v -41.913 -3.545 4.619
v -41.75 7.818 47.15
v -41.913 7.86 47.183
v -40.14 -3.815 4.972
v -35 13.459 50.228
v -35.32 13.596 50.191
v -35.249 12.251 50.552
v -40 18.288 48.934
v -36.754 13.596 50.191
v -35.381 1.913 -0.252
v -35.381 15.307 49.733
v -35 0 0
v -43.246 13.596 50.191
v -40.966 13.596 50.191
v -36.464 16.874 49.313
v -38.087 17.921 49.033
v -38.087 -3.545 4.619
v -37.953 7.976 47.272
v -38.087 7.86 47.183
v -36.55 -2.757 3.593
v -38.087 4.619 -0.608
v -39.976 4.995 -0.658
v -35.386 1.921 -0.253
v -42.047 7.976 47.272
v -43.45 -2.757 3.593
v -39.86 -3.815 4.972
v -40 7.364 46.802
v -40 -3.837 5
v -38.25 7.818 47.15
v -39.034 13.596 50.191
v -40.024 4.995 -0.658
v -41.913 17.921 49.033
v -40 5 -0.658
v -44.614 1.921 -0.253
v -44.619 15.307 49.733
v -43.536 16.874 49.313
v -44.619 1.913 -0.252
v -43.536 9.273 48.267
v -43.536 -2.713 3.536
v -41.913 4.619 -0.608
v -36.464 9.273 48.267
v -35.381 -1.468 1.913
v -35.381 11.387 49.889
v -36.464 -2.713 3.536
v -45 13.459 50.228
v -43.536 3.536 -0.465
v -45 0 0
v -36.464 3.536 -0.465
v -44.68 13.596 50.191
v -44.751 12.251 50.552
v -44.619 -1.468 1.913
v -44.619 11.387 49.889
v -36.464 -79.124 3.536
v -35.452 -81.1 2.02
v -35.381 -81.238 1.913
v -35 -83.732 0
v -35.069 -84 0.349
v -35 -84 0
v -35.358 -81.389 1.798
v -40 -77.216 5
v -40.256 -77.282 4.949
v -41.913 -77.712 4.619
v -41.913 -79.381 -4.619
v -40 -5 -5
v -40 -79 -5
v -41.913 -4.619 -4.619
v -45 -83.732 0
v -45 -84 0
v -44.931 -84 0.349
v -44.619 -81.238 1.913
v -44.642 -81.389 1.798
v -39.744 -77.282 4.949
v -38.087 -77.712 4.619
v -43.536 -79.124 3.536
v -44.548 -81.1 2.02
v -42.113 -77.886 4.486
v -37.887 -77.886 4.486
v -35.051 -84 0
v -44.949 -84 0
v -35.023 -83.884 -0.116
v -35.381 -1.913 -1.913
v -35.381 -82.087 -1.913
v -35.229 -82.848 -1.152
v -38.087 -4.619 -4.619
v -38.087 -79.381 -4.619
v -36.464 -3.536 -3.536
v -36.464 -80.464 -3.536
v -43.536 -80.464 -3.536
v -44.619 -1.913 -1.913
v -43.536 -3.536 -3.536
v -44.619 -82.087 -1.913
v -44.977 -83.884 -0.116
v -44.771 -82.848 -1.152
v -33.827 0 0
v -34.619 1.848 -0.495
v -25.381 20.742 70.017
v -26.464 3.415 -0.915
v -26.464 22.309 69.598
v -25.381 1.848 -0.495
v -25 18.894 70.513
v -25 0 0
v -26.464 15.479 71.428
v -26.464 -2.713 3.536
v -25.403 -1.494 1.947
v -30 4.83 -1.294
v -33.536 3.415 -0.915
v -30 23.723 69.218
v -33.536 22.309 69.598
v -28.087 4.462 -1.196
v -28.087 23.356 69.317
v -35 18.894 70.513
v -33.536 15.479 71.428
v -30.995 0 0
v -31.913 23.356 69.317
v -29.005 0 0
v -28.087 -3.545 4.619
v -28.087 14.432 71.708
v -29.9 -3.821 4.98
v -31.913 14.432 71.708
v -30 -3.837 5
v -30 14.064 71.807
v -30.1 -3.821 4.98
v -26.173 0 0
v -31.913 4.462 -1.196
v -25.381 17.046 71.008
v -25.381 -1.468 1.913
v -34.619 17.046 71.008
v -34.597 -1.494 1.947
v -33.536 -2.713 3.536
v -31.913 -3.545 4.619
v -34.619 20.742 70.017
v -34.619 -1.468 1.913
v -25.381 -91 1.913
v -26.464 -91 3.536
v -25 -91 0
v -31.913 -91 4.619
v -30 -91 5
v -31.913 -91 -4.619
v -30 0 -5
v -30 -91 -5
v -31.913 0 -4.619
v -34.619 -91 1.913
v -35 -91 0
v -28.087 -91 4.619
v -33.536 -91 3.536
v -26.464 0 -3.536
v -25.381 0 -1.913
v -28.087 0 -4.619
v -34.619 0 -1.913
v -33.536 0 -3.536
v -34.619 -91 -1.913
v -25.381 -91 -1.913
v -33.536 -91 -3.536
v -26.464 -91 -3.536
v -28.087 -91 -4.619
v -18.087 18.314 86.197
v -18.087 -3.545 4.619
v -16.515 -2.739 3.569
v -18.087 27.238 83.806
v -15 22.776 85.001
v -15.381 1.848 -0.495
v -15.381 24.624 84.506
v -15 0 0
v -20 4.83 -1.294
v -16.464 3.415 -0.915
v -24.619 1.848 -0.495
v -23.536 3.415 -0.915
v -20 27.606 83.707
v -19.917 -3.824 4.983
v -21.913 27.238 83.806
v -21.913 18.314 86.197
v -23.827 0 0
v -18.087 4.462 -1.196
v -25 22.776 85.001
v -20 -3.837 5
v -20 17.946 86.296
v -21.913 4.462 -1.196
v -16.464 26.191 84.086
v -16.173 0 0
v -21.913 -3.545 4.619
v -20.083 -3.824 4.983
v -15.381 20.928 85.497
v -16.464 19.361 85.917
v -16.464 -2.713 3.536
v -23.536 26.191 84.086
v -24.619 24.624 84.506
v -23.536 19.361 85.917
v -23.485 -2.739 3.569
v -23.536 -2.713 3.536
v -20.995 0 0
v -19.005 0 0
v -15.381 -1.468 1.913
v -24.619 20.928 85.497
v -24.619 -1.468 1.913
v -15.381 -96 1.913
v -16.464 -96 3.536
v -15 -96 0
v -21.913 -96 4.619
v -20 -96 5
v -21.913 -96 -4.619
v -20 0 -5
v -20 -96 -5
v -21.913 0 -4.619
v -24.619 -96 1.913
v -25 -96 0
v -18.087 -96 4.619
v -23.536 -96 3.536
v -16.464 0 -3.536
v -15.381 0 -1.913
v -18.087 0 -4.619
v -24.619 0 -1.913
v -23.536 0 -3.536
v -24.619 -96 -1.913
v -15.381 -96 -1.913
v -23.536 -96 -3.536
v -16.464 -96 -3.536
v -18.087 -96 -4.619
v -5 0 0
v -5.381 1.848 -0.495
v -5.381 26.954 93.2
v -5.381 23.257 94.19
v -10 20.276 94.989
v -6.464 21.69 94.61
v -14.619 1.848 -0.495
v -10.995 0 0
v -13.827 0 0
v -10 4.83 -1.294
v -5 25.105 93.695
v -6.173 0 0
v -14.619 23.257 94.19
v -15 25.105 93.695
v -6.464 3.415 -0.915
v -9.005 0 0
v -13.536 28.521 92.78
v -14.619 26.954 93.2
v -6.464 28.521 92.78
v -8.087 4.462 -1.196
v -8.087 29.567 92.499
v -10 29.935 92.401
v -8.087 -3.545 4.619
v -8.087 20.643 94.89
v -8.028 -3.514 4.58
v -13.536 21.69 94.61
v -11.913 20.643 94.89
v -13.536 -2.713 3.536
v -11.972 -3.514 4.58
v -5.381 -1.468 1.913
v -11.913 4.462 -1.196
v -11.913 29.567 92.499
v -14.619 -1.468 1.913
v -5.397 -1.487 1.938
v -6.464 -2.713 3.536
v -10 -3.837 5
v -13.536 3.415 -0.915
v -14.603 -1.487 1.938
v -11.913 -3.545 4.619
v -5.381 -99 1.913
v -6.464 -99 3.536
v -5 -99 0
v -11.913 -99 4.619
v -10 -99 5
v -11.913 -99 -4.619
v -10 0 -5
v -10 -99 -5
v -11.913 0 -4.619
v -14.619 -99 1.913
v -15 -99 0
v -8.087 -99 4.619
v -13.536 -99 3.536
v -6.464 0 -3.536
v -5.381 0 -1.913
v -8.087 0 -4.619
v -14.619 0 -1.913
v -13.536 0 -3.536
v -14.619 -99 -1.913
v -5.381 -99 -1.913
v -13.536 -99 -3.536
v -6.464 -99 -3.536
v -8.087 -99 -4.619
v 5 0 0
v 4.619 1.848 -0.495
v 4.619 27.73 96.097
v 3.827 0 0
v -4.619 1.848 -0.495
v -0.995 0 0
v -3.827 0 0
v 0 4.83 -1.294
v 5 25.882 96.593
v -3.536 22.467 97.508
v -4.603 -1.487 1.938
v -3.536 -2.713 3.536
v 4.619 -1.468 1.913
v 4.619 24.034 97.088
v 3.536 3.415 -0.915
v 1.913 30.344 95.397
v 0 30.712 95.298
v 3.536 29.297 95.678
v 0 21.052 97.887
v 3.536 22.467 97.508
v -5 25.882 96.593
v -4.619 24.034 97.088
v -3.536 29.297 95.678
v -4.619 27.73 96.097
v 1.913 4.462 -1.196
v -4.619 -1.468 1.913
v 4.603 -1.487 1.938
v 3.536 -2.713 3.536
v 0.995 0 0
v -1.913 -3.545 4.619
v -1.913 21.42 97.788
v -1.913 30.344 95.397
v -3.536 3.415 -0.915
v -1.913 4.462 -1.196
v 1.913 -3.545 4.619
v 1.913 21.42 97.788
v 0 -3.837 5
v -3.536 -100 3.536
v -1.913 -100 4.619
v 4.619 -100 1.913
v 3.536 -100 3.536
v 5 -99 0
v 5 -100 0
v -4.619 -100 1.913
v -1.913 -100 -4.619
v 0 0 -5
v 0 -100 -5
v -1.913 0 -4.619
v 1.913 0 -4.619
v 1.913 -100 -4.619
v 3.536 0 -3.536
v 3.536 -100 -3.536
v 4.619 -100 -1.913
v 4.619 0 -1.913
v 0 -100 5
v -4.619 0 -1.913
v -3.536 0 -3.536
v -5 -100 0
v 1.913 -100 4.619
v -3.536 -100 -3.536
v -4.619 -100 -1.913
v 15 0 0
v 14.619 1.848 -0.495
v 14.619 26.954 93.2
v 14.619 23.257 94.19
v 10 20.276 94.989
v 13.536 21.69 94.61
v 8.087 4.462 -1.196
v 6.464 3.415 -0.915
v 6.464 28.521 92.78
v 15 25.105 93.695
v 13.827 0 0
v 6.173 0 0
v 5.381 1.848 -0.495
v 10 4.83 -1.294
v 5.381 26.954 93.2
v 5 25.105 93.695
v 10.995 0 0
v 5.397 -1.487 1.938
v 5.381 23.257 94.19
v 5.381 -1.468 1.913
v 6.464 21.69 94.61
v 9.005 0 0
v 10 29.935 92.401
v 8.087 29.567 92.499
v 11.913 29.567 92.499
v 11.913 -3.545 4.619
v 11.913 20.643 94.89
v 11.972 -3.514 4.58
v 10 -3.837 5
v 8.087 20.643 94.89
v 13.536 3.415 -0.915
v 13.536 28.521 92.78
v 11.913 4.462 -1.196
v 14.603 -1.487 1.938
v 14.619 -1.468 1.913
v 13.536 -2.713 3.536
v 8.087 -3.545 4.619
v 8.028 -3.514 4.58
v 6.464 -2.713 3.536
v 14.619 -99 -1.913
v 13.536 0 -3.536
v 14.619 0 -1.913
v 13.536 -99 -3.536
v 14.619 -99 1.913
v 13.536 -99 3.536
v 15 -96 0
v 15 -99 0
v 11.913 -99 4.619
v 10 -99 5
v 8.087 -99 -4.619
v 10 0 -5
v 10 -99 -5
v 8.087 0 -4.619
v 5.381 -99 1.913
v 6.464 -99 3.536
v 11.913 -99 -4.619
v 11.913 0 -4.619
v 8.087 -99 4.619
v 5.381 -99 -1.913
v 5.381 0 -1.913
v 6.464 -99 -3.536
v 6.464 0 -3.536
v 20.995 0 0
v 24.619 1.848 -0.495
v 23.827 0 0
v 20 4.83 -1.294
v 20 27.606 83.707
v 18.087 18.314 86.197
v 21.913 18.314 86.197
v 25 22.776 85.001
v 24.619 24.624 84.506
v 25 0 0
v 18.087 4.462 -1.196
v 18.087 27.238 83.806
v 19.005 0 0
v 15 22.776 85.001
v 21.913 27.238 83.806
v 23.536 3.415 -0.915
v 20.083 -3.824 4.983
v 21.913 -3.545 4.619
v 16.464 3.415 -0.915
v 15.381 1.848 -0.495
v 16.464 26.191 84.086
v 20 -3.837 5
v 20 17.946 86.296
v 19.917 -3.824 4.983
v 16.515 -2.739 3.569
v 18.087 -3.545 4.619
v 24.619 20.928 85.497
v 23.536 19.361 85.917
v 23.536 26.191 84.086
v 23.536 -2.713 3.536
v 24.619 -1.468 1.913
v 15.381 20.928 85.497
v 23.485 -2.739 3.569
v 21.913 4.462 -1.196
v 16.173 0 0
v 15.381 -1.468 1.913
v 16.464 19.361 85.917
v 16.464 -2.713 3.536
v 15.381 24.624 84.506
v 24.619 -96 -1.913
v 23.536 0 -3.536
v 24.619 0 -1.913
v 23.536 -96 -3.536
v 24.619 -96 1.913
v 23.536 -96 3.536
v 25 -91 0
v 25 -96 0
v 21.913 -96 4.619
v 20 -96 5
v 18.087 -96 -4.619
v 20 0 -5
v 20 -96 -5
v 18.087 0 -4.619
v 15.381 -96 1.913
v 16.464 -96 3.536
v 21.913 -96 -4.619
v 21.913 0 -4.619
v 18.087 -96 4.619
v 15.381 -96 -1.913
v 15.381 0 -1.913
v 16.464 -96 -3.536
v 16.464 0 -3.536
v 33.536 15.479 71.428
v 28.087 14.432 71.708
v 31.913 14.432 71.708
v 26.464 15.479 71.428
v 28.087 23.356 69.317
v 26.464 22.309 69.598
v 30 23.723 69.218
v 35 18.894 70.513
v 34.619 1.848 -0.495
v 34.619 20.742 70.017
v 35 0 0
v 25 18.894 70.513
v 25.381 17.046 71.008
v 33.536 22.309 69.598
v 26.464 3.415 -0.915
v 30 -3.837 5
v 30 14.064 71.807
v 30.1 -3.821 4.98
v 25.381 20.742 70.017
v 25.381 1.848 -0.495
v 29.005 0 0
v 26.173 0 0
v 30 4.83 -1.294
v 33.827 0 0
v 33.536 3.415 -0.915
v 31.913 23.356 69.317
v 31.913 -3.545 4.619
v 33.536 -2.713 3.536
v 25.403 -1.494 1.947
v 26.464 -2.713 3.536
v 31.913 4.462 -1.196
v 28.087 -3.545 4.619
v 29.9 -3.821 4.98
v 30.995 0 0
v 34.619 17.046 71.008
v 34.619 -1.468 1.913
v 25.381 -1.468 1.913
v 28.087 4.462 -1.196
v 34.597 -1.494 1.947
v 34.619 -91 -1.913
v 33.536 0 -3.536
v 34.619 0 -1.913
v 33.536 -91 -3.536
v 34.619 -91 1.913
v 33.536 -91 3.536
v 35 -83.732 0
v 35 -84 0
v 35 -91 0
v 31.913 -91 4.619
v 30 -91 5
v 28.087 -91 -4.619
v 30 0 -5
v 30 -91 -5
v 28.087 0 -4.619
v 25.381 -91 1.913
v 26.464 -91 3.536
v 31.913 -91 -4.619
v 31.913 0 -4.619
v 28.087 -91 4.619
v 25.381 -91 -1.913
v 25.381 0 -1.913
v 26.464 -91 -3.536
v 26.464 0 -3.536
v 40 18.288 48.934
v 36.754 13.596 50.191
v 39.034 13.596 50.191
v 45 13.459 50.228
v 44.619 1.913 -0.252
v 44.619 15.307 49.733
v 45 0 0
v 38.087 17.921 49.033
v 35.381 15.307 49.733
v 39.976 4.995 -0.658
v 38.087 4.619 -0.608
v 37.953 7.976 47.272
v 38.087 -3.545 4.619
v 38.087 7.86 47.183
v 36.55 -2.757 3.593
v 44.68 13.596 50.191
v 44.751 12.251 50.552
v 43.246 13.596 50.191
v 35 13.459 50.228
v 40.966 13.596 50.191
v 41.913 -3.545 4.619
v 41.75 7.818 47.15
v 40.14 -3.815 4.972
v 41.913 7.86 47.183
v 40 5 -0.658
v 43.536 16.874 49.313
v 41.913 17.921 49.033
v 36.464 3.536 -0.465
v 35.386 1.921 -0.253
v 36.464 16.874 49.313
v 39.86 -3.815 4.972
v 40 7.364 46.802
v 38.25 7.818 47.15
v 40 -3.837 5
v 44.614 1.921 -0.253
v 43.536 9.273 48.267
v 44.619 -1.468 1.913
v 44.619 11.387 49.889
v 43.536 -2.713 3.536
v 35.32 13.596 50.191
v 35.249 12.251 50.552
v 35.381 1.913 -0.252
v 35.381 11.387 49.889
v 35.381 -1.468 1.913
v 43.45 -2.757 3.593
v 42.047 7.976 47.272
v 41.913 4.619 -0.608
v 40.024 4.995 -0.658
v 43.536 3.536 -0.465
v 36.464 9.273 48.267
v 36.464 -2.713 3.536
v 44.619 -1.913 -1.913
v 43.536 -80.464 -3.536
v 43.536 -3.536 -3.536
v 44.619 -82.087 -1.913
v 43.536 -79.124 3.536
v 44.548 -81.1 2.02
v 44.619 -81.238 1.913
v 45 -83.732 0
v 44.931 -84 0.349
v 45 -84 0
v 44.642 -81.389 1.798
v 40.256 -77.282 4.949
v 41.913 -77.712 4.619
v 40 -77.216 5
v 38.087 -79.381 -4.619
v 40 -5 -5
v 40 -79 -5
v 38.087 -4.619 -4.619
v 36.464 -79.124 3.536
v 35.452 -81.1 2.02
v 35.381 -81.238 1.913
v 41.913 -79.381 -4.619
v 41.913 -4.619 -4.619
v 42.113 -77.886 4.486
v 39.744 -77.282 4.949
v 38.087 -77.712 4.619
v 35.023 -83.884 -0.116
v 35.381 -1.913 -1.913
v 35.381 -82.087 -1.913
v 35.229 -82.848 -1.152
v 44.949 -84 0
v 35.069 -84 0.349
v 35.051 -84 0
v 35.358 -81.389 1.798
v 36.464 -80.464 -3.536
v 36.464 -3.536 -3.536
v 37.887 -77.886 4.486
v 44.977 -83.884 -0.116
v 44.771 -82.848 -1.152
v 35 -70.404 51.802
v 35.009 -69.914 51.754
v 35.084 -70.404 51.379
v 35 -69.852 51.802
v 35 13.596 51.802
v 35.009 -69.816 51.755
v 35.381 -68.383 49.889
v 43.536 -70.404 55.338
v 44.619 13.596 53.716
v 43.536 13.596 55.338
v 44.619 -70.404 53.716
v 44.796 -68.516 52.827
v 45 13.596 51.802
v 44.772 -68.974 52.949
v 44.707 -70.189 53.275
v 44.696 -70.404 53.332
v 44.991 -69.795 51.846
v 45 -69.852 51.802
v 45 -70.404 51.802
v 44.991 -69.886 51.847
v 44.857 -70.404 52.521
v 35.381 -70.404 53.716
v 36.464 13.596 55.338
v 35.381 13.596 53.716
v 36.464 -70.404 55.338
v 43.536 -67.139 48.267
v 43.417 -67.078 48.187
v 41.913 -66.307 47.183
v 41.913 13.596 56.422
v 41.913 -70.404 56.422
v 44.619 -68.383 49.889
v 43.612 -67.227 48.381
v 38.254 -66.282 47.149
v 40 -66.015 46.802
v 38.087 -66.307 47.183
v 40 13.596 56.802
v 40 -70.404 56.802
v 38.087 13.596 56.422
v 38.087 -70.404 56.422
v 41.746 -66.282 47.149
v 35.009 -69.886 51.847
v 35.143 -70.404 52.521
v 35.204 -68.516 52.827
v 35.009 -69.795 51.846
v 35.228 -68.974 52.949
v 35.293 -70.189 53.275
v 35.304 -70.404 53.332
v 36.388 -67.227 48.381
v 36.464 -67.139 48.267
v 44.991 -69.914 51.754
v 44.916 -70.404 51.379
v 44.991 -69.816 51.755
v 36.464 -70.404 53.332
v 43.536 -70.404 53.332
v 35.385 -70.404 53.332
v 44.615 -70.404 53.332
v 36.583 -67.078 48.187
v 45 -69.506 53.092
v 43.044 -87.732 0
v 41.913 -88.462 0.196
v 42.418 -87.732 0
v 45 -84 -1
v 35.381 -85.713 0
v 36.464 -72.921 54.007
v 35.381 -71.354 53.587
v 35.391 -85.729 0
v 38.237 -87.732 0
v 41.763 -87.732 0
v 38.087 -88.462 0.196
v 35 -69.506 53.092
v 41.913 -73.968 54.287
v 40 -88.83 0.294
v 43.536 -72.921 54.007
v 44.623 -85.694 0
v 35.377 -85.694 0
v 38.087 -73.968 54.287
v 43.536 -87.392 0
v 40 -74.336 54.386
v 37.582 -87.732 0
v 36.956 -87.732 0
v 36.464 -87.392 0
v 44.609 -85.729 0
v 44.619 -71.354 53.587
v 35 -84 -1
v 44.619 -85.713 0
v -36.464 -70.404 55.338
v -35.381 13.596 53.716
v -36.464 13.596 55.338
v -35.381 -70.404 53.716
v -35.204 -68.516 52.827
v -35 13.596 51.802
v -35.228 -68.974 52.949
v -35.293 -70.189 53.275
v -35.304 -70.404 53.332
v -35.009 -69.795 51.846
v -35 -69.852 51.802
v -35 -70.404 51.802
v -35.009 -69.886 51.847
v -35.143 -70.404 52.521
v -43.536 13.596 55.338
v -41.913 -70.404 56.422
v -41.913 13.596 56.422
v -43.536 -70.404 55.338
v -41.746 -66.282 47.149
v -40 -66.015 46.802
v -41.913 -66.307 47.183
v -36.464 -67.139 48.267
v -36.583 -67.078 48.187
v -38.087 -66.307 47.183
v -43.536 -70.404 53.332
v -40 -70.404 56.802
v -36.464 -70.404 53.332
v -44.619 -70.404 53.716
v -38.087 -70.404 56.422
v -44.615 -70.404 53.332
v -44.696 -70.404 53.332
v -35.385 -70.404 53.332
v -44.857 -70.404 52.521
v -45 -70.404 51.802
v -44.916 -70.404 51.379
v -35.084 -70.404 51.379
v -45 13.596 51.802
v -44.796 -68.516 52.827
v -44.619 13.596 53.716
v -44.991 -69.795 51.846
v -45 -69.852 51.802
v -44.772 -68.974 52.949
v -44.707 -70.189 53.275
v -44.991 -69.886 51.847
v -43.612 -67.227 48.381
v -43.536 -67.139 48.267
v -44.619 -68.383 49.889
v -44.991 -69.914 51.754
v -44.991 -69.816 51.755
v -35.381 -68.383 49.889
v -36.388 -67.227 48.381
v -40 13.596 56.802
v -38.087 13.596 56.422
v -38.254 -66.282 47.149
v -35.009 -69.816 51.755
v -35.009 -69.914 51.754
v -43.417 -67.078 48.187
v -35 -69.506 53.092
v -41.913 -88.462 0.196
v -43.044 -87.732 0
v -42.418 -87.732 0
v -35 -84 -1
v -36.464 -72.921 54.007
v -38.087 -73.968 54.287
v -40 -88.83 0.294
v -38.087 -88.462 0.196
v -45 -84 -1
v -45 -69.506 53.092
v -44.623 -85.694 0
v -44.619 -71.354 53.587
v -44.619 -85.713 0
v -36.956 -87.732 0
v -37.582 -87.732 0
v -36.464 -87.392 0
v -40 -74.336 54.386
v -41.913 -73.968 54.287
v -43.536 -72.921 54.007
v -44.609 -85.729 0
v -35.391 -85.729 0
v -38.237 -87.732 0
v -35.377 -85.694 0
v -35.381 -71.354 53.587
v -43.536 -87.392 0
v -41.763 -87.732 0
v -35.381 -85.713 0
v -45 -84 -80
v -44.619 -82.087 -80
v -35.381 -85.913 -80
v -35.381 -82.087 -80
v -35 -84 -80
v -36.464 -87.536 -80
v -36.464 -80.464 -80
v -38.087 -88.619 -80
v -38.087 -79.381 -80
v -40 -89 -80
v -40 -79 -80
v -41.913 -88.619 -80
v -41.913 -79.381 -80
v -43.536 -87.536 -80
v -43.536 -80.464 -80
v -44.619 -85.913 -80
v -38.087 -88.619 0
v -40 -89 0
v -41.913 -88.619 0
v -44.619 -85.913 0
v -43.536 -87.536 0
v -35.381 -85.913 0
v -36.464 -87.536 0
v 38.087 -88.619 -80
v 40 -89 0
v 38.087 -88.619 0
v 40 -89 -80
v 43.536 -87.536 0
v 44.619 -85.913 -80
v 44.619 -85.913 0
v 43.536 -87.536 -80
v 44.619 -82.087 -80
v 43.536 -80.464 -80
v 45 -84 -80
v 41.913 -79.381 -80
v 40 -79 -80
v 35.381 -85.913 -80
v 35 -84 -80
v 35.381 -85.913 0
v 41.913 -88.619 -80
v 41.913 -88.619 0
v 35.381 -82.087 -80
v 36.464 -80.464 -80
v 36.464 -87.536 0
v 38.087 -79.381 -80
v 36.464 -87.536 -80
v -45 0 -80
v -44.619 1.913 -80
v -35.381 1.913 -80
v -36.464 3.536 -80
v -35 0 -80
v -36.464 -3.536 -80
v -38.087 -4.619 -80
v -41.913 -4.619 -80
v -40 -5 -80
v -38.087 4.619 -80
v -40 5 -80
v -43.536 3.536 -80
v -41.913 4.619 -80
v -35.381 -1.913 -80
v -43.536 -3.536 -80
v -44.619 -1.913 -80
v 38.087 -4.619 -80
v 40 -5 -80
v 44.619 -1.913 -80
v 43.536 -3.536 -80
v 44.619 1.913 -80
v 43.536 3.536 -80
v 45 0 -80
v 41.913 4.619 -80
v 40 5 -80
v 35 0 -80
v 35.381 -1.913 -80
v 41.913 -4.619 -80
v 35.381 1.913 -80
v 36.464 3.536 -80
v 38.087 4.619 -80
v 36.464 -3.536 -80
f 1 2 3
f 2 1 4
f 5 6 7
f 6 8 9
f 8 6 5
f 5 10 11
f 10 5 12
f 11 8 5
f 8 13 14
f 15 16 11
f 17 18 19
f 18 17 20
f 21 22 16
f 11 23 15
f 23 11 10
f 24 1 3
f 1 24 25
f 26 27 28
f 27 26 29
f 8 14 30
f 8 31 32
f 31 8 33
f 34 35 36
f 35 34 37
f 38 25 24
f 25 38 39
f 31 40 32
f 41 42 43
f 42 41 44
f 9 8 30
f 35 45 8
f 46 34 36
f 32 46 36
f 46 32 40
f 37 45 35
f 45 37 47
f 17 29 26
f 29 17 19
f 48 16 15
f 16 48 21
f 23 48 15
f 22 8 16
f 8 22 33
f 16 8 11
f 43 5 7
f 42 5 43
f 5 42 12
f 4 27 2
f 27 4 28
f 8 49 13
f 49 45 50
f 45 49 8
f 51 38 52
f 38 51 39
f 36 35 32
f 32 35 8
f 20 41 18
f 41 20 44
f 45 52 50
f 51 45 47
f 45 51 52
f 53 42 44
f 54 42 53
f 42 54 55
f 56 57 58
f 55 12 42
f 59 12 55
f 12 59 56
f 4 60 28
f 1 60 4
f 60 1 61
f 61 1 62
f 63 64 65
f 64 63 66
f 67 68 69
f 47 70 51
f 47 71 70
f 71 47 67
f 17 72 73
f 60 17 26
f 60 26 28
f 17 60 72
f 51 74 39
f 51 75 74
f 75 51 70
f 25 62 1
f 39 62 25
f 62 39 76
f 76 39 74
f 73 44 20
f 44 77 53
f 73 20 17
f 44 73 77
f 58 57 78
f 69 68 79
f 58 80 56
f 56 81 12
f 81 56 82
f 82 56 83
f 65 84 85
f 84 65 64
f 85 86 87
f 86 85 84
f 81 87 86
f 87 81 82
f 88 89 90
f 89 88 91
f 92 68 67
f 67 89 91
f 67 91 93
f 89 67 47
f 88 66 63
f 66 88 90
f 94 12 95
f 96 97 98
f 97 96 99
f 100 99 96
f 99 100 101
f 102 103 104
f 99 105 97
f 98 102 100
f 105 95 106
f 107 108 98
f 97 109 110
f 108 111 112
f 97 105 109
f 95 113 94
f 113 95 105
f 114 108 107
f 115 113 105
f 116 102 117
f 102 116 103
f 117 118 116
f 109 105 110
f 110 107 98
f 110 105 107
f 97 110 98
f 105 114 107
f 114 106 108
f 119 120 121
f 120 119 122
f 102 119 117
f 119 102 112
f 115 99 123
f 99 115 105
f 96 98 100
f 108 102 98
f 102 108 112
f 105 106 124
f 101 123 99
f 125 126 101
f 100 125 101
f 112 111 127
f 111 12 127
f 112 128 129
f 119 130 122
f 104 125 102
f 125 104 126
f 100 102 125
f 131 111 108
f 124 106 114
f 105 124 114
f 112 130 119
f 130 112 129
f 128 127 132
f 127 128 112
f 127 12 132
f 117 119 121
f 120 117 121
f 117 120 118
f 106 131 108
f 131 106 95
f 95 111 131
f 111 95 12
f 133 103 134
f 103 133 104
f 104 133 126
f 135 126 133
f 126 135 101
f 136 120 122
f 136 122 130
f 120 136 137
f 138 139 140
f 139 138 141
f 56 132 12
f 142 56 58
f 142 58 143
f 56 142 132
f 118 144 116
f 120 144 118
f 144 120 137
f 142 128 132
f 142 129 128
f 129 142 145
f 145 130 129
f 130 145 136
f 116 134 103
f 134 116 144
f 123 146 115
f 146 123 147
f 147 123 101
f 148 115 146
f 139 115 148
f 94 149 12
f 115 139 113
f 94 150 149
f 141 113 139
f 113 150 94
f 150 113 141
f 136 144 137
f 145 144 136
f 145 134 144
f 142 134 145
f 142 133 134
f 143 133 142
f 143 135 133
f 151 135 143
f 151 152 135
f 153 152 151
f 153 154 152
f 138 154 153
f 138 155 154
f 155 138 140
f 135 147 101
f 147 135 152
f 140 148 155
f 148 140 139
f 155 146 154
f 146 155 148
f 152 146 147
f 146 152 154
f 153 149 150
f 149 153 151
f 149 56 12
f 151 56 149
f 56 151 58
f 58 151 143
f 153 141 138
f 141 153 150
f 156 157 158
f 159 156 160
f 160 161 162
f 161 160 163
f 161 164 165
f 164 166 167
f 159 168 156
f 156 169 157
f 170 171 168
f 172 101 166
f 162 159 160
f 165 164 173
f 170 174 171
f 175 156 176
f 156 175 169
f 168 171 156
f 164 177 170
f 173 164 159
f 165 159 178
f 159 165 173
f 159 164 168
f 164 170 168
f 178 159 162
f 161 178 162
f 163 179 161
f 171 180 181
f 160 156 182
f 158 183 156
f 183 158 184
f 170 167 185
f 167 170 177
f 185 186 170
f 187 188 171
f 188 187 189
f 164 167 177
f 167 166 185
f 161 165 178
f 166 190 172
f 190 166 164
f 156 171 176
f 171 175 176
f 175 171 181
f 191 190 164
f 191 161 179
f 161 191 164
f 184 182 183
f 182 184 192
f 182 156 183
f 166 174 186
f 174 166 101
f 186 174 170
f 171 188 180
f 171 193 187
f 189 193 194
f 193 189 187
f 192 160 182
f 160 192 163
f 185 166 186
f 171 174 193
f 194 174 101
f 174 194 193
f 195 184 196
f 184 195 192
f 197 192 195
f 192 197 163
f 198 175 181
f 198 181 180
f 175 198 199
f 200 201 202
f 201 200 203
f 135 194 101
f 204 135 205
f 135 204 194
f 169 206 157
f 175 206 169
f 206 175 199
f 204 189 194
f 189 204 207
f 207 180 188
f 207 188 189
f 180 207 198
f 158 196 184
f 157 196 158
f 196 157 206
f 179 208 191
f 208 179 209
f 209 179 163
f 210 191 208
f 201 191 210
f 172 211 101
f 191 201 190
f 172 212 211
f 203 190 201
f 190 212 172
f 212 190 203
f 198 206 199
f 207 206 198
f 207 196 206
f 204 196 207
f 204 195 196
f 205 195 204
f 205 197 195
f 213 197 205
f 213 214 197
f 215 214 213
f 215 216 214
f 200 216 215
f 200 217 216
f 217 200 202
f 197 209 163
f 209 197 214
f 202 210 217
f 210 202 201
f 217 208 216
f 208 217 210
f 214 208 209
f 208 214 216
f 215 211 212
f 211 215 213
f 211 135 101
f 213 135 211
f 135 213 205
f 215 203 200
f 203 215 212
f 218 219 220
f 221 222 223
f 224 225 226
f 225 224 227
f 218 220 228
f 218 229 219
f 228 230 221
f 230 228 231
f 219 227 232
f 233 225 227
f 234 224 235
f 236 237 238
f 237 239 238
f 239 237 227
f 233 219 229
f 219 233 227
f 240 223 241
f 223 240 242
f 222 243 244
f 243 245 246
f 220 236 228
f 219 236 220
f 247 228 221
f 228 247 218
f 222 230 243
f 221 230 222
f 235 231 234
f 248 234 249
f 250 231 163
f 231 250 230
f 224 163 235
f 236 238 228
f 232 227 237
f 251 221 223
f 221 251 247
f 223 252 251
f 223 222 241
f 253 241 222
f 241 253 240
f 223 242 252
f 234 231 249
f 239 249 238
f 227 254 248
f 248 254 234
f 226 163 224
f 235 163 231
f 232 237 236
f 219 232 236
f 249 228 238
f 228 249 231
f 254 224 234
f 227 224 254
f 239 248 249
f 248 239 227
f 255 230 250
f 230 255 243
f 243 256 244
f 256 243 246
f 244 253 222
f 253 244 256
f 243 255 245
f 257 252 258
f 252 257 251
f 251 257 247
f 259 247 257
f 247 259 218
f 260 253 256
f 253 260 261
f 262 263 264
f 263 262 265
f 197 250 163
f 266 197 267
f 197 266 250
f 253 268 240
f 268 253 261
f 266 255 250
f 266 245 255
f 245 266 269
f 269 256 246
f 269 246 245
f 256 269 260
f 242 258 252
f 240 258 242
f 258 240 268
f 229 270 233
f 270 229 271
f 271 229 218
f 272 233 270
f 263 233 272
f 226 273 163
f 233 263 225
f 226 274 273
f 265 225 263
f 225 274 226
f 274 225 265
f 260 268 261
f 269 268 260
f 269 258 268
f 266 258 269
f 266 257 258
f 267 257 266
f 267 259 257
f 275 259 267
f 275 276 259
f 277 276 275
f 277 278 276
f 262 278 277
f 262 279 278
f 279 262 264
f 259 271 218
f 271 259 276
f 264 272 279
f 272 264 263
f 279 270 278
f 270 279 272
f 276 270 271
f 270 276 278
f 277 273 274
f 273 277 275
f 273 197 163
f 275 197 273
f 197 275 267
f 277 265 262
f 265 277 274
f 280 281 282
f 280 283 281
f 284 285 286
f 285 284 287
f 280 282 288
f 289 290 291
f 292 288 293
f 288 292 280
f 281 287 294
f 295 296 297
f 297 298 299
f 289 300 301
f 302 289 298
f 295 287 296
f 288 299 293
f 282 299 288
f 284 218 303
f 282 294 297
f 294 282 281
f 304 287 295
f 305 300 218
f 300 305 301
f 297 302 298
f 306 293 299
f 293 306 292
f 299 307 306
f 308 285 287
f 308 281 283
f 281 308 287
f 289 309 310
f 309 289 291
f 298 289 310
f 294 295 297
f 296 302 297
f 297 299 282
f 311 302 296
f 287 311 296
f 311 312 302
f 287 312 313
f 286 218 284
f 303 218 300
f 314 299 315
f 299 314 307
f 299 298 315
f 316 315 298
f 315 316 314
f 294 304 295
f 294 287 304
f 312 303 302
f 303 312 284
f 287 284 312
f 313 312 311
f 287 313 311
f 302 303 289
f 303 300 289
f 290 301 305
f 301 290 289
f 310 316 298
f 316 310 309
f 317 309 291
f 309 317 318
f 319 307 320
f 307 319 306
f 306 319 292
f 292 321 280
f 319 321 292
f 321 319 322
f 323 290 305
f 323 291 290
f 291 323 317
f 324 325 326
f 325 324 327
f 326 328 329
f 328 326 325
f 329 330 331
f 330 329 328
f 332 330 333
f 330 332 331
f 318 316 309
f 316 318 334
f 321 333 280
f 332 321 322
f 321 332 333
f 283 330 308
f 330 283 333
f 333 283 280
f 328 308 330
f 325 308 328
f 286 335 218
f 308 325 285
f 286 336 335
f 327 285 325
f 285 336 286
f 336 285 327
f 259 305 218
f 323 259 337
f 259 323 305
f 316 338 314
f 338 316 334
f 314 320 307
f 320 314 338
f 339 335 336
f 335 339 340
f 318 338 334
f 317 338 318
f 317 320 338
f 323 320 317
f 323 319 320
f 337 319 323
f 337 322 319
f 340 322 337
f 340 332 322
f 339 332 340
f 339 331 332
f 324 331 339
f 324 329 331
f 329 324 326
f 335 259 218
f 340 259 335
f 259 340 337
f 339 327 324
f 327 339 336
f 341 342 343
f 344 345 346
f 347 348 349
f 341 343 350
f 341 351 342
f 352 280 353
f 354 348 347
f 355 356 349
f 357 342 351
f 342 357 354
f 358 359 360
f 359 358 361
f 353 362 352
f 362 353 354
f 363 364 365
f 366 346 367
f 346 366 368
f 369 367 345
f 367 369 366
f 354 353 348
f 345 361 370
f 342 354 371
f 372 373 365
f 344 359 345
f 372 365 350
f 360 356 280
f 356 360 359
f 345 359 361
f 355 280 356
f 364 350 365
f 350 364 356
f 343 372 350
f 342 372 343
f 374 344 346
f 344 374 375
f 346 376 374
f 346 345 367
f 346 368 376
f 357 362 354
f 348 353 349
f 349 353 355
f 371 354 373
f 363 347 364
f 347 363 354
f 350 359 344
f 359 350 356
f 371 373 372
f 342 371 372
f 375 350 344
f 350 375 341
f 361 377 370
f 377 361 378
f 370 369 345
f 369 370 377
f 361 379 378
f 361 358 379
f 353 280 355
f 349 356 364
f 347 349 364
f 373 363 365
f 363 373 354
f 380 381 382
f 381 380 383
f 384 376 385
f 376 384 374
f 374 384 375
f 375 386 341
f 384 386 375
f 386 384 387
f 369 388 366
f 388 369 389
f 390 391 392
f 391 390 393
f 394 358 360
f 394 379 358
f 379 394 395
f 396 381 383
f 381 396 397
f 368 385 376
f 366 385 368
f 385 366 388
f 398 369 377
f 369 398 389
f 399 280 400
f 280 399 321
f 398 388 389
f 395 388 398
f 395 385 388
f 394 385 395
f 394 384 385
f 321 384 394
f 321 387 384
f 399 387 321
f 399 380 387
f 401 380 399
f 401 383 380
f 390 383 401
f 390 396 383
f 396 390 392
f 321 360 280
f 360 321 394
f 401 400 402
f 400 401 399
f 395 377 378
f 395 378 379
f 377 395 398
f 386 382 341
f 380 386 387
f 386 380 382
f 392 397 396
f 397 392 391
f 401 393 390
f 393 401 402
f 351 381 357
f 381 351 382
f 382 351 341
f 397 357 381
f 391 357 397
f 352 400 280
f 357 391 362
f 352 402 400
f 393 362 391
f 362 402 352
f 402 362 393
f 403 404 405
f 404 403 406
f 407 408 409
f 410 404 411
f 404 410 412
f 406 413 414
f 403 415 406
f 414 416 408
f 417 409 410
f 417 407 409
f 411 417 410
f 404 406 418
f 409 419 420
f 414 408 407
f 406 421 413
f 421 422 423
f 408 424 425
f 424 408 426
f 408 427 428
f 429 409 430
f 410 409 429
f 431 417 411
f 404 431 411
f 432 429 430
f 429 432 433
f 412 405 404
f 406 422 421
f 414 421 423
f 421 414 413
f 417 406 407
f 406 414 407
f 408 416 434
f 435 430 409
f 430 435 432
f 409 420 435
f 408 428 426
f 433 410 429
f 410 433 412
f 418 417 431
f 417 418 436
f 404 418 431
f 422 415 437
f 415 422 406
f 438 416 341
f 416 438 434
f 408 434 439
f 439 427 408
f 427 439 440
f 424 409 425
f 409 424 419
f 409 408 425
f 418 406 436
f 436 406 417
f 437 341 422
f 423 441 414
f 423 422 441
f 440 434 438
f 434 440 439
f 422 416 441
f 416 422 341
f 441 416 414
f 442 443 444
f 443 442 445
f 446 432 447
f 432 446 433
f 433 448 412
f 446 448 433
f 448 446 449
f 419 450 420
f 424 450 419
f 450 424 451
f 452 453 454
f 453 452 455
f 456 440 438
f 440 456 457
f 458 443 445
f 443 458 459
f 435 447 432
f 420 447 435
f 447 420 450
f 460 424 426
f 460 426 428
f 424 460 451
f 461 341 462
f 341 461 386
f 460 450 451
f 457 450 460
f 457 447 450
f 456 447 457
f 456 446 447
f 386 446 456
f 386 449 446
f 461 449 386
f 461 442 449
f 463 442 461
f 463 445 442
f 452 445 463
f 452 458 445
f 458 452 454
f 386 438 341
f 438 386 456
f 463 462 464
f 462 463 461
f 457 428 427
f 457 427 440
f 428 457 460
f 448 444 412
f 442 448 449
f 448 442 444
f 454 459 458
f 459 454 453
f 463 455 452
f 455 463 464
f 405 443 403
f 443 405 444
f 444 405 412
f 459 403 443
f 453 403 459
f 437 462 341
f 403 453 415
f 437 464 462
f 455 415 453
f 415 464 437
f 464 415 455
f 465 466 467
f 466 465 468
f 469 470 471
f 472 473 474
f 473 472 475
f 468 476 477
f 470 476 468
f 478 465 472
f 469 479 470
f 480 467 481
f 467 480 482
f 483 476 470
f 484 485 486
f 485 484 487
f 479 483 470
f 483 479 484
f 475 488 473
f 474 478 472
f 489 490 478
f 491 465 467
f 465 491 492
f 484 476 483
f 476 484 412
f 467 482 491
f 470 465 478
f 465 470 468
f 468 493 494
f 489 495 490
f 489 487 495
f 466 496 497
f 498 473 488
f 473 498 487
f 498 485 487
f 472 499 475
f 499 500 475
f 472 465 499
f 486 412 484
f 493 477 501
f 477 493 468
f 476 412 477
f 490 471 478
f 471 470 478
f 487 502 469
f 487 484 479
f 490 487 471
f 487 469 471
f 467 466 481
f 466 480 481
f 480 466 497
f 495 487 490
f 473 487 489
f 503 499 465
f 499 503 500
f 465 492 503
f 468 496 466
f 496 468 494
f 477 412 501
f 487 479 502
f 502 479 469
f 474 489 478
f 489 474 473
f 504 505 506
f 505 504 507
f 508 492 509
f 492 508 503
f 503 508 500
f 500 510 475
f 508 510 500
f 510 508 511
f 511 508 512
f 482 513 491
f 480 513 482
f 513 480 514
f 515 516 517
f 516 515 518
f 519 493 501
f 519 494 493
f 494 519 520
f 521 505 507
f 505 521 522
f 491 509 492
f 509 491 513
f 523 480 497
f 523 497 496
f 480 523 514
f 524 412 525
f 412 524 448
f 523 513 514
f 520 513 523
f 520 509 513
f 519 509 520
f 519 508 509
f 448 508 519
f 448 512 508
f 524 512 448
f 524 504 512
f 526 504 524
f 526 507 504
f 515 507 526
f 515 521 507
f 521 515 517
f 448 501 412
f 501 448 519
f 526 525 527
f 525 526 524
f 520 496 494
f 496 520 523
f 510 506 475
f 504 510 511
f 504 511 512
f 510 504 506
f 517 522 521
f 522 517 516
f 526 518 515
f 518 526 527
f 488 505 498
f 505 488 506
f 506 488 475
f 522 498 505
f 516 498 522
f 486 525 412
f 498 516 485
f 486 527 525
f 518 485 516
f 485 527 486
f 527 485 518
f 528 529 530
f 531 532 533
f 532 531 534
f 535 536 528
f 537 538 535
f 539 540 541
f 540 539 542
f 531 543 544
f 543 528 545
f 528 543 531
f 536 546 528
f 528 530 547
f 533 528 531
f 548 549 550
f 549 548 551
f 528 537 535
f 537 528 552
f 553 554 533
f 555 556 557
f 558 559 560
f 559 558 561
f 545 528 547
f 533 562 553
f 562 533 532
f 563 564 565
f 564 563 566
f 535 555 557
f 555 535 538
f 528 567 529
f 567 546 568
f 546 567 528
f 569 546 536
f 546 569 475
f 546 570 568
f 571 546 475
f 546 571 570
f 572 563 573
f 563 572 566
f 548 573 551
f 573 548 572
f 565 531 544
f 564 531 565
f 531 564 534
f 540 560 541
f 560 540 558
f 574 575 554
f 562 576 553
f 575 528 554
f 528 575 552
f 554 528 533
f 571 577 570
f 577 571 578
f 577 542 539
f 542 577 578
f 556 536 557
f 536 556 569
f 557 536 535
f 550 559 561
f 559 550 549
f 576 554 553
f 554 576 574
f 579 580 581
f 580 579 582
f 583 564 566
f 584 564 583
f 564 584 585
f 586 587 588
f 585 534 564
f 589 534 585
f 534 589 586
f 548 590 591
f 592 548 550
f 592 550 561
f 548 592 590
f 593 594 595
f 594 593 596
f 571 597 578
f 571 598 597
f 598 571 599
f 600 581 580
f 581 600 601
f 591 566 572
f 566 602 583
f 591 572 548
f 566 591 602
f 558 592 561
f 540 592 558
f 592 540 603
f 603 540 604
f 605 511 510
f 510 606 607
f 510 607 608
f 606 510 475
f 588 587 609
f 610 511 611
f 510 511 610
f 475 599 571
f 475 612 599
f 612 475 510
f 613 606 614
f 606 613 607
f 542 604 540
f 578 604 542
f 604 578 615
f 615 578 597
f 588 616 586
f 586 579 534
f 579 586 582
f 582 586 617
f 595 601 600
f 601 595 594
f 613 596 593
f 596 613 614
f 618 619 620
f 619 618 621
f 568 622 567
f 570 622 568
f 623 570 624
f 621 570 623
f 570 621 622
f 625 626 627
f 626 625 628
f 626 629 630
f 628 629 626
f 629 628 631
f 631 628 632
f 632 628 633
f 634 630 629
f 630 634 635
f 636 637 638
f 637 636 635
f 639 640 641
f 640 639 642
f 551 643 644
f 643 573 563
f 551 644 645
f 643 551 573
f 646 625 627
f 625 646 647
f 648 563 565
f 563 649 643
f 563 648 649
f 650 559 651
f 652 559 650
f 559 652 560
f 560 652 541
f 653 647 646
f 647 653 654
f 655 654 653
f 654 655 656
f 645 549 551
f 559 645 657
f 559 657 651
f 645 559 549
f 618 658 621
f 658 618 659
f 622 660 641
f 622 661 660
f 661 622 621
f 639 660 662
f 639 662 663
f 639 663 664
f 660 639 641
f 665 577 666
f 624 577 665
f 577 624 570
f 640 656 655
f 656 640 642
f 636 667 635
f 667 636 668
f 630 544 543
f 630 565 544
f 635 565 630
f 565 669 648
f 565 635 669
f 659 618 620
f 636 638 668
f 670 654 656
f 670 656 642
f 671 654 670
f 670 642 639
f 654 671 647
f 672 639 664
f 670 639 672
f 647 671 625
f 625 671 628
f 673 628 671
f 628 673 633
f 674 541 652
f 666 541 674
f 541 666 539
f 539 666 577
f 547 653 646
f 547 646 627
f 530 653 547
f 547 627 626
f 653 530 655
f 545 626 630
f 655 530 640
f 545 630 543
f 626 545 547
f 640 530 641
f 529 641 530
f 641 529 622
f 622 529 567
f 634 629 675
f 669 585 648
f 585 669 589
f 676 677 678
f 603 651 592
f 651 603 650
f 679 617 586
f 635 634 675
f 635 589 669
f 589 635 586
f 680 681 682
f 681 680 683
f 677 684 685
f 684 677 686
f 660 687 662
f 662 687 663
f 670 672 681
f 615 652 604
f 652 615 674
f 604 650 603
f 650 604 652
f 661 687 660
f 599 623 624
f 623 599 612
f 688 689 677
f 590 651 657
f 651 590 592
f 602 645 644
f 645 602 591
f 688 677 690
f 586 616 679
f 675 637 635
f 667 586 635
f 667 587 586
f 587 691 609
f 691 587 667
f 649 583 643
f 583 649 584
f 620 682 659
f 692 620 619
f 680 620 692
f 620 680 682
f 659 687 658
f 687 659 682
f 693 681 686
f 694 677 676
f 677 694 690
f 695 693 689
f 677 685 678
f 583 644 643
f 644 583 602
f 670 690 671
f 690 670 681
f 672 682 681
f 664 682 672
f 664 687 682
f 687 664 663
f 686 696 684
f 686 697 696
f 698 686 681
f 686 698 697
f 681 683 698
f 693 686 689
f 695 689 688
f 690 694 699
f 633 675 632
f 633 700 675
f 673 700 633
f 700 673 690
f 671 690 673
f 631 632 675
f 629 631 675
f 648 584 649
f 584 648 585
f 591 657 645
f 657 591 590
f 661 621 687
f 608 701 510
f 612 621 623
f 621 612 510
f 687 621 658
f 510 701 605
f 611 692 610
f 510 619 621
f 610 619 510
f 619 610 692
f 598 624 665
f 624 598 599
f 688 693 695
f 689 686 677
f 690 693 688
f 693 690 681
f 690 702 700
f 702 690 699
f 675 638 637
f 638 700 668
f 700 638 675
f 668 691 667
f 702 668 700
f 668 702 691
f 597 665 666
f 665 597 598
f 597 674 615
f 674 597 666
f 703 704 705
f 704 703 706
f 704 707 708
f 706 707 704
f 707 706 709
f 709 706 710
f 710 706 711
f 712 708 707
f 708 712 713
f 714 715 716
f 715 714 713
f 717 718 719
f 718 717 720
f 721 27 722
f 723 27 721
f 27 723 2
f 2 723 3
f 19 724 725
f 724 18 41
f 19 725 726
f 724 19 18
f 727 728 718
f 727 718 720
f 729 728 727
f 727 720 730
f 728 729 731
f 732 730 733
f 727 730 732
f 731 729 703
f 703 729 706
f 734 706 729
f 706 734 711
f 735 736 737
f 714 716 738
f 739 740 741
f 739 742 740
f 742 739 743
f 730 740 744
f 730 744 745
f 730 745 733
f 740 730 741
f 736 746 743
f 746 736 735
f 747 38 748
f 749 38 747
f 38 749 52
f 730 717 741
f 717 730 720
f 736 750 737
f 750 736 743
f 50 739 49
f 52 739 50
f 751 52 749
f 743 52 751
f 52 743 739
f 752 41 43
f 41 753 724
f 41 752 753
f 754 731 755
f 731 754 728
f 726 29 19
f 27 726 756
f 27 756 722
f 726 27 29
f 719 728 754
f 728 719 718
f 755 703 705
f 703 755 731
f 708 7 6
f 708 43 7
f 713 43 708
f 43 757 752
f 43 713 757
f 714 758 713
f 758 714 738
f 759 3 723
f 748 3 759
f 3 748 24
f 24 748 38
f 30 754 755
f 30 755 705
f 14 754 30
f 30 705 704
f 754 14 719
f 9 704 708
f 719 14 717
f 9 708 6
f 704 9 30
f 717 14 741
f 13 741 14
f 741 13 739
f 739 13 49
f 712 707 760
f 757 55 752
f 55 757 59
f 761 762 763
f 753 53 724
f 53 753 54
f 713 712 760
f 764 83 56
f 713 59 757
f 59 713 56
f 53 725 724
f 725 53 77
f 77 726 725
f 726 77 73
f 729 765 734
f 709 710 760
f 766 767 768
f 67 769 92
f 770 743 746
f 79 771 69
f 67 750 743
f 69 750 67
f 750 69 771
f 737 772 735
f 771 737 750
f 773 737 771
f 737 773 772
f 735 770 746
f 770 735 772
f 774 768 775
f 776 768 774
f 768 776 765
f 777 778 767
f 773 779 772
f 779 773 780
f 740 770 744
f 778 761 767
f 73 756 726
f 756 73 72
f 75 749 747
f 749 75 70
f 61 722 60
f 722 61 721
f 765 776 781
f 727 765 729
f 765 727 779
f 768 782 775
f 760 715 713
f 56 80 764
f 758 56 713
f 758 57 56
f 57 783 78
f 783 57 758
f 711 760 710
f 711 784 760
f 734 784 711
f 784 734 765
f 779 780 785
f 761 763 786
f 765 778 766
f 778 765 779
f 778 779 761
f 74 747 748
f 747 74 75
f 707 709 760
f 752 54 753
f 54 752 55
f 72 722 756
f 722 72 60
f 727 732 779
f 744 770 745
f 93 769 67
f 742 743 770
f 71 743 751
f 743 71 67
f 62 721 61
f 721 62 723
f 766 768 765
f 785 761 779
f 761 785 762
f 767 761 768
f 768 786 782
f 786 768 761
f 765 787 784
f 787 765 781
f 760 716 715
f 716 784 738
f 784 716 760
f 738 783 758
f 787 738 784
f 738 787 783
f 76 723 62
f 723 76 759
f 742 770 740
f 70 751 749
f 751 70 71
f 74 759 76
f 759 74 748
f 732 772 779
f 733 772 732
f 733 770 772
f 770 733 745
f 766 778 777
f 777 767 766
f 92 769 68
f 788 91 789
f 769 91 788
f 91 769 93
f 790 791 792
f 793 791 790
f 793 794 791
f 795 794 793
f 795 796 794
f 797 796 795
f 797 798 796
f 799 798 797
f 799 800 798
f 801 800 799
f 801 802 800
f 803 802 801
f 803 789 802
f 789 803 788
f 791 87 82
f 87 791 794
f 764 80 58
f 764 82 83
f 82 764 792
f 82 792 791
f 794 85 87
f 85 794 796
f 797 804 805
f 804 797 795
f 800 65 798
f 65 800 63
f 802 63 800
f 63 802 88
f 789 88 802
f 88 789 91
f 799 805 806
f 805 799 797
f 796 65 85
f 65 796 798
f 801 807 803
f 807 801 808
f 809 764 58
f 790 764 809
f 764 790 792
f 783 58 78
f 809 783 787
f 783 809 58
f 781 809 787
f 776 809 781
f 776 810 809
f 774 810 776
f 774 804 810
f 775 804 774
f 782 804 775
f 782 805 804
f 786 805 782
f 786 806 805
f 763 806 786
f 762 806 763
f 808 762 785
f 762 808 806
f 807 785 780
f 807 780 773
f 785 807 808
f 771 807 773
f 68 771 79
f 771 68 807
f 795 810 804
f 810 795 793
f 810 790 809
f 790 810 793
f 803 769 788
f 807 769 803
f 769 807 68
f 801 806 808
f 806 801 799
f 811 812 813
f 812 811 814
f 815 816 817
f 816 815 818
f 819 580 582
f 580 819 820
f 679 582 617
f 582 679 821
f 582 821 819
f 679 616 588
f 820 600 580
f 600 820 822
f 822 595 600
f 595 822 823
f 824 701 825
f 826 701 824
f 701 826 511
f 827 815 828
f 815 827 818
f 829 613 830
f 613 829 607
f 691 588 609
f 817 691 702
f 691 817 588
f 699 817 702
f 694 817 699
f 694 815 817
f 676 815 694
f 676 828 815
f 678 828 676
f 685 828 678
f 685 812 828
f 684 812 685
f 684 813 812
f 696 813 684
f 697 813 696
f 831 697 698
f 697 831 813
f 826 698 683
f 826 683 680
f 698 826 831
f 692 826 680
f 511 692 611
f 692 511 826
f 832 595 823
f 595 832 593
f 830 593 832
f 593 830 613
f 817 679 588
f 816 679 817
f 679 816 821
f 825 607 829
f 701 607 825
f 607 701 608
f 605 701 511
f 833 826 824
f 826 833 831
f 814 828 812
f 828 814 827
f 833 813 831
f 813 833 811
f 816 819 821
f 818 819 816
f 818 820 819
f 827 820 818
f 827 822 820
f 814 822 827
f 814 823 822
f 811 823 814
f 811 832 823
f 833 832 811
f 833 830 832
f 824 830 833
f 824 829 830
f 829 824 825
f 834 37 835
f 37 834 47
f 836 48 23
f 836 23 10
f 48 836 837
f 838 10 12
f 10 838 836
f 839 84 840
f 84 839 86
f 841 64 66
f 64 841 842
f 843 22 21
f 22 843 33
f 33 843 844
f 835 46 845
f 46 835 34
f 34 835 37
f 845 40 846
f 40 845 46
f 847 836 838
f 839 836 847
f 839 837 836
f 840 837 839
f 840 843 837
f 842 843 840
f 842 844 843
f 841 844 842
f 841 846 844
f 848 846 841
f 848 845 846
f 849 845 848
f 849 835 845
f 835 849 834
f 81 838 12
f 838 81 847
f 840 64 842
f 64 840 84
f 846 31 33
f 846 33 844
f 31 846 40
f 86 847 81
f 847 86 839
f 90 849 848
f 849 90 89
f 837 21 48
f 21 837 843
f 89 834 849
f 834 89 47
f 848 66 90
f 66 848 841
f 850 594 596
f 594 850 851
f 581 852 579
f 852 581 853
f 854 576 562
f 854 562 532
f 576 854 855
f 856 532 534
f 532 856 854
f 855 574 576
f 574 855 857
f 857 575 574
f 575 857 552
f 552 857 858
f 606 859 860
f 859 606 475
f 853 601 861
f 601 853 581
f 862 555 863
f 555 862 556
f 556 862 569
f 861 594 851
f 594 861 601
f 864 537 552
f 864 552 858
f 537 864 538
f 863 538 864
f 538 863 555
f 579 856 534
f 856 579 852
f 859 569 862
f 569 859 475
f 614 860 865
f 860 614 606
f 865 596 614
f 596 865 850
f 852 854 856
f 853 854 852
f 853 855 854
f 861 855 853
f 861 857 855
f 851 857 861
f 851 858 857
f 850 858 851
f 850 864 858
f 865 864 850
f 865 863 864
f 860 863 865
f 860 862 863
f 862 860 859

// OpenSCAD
//////////////////////////////////////////////////////////////////////////////////////Open SCAD/////////////////////////////////
/*//////////////////////////////////////////////////////////////

date started:	6/10/2013	
date finished:	
modeler:			Patrick Conner
copyright:		N/A

*/


//////////////////////////////////////////////////////////////////////////////////////////parameters/////////////////////////////////////////////////////////////////////////////////////////
slope_distance=(cos(5)*(100-4*4*3));
slope_regress=(sin(5)*(100-4*4*3)*3);
arm_x=(4*10);
base_length=(100-(4*4));



////////////////////////////////////////////////////////////////////////////////////////////renders//////////////////////////////////////////////////////////////////////////////////////////


for(back_x=[-4:4]){
	translate([back_x*10,0,0])
		rotate([-15,0,0])
			cylinder(100-(back_x*back_x*3),5,5);
	translate([back_x*10,0,0])
		rotate([90,0,0])
			cylinder(100-(back_x*back_x),5,5);
}


translate([arm_x,slope_regress,slope_distance])
	rotate([90,0,0])
		cylinder(base_length,5,5);
translate([arm_x,-base_length,-1])
	rotate([-15,0,0])
		cylinder((100-4*4*3)+4,5,5);
translate([-arm_x,slope_regress,slope_distance])
	rotate([90,0,0])
		cylinder(base_length,5,5);
translate([-arm_x,-base_length,-1])
	rotate([-15,0,0])
		cylinder((100-4*4*3)+4,5,5);

translate([-arm_x,-base_length,-80])
	cylinder(80,5,5);
translate([arm_x,-base_length,-80])
	cylinder(80,5,5);
translate([-arm_x,0,-80])
	cylinder(80,5,5);
translate([arm_x,0,-80])
	cylinder(80,5,5);

echo(slope_distance, base_length);
/////////////////////////////////////////////////////////////////////////////////////////////modules/////////////////////////////////////////////////////////////////////////////////////////
